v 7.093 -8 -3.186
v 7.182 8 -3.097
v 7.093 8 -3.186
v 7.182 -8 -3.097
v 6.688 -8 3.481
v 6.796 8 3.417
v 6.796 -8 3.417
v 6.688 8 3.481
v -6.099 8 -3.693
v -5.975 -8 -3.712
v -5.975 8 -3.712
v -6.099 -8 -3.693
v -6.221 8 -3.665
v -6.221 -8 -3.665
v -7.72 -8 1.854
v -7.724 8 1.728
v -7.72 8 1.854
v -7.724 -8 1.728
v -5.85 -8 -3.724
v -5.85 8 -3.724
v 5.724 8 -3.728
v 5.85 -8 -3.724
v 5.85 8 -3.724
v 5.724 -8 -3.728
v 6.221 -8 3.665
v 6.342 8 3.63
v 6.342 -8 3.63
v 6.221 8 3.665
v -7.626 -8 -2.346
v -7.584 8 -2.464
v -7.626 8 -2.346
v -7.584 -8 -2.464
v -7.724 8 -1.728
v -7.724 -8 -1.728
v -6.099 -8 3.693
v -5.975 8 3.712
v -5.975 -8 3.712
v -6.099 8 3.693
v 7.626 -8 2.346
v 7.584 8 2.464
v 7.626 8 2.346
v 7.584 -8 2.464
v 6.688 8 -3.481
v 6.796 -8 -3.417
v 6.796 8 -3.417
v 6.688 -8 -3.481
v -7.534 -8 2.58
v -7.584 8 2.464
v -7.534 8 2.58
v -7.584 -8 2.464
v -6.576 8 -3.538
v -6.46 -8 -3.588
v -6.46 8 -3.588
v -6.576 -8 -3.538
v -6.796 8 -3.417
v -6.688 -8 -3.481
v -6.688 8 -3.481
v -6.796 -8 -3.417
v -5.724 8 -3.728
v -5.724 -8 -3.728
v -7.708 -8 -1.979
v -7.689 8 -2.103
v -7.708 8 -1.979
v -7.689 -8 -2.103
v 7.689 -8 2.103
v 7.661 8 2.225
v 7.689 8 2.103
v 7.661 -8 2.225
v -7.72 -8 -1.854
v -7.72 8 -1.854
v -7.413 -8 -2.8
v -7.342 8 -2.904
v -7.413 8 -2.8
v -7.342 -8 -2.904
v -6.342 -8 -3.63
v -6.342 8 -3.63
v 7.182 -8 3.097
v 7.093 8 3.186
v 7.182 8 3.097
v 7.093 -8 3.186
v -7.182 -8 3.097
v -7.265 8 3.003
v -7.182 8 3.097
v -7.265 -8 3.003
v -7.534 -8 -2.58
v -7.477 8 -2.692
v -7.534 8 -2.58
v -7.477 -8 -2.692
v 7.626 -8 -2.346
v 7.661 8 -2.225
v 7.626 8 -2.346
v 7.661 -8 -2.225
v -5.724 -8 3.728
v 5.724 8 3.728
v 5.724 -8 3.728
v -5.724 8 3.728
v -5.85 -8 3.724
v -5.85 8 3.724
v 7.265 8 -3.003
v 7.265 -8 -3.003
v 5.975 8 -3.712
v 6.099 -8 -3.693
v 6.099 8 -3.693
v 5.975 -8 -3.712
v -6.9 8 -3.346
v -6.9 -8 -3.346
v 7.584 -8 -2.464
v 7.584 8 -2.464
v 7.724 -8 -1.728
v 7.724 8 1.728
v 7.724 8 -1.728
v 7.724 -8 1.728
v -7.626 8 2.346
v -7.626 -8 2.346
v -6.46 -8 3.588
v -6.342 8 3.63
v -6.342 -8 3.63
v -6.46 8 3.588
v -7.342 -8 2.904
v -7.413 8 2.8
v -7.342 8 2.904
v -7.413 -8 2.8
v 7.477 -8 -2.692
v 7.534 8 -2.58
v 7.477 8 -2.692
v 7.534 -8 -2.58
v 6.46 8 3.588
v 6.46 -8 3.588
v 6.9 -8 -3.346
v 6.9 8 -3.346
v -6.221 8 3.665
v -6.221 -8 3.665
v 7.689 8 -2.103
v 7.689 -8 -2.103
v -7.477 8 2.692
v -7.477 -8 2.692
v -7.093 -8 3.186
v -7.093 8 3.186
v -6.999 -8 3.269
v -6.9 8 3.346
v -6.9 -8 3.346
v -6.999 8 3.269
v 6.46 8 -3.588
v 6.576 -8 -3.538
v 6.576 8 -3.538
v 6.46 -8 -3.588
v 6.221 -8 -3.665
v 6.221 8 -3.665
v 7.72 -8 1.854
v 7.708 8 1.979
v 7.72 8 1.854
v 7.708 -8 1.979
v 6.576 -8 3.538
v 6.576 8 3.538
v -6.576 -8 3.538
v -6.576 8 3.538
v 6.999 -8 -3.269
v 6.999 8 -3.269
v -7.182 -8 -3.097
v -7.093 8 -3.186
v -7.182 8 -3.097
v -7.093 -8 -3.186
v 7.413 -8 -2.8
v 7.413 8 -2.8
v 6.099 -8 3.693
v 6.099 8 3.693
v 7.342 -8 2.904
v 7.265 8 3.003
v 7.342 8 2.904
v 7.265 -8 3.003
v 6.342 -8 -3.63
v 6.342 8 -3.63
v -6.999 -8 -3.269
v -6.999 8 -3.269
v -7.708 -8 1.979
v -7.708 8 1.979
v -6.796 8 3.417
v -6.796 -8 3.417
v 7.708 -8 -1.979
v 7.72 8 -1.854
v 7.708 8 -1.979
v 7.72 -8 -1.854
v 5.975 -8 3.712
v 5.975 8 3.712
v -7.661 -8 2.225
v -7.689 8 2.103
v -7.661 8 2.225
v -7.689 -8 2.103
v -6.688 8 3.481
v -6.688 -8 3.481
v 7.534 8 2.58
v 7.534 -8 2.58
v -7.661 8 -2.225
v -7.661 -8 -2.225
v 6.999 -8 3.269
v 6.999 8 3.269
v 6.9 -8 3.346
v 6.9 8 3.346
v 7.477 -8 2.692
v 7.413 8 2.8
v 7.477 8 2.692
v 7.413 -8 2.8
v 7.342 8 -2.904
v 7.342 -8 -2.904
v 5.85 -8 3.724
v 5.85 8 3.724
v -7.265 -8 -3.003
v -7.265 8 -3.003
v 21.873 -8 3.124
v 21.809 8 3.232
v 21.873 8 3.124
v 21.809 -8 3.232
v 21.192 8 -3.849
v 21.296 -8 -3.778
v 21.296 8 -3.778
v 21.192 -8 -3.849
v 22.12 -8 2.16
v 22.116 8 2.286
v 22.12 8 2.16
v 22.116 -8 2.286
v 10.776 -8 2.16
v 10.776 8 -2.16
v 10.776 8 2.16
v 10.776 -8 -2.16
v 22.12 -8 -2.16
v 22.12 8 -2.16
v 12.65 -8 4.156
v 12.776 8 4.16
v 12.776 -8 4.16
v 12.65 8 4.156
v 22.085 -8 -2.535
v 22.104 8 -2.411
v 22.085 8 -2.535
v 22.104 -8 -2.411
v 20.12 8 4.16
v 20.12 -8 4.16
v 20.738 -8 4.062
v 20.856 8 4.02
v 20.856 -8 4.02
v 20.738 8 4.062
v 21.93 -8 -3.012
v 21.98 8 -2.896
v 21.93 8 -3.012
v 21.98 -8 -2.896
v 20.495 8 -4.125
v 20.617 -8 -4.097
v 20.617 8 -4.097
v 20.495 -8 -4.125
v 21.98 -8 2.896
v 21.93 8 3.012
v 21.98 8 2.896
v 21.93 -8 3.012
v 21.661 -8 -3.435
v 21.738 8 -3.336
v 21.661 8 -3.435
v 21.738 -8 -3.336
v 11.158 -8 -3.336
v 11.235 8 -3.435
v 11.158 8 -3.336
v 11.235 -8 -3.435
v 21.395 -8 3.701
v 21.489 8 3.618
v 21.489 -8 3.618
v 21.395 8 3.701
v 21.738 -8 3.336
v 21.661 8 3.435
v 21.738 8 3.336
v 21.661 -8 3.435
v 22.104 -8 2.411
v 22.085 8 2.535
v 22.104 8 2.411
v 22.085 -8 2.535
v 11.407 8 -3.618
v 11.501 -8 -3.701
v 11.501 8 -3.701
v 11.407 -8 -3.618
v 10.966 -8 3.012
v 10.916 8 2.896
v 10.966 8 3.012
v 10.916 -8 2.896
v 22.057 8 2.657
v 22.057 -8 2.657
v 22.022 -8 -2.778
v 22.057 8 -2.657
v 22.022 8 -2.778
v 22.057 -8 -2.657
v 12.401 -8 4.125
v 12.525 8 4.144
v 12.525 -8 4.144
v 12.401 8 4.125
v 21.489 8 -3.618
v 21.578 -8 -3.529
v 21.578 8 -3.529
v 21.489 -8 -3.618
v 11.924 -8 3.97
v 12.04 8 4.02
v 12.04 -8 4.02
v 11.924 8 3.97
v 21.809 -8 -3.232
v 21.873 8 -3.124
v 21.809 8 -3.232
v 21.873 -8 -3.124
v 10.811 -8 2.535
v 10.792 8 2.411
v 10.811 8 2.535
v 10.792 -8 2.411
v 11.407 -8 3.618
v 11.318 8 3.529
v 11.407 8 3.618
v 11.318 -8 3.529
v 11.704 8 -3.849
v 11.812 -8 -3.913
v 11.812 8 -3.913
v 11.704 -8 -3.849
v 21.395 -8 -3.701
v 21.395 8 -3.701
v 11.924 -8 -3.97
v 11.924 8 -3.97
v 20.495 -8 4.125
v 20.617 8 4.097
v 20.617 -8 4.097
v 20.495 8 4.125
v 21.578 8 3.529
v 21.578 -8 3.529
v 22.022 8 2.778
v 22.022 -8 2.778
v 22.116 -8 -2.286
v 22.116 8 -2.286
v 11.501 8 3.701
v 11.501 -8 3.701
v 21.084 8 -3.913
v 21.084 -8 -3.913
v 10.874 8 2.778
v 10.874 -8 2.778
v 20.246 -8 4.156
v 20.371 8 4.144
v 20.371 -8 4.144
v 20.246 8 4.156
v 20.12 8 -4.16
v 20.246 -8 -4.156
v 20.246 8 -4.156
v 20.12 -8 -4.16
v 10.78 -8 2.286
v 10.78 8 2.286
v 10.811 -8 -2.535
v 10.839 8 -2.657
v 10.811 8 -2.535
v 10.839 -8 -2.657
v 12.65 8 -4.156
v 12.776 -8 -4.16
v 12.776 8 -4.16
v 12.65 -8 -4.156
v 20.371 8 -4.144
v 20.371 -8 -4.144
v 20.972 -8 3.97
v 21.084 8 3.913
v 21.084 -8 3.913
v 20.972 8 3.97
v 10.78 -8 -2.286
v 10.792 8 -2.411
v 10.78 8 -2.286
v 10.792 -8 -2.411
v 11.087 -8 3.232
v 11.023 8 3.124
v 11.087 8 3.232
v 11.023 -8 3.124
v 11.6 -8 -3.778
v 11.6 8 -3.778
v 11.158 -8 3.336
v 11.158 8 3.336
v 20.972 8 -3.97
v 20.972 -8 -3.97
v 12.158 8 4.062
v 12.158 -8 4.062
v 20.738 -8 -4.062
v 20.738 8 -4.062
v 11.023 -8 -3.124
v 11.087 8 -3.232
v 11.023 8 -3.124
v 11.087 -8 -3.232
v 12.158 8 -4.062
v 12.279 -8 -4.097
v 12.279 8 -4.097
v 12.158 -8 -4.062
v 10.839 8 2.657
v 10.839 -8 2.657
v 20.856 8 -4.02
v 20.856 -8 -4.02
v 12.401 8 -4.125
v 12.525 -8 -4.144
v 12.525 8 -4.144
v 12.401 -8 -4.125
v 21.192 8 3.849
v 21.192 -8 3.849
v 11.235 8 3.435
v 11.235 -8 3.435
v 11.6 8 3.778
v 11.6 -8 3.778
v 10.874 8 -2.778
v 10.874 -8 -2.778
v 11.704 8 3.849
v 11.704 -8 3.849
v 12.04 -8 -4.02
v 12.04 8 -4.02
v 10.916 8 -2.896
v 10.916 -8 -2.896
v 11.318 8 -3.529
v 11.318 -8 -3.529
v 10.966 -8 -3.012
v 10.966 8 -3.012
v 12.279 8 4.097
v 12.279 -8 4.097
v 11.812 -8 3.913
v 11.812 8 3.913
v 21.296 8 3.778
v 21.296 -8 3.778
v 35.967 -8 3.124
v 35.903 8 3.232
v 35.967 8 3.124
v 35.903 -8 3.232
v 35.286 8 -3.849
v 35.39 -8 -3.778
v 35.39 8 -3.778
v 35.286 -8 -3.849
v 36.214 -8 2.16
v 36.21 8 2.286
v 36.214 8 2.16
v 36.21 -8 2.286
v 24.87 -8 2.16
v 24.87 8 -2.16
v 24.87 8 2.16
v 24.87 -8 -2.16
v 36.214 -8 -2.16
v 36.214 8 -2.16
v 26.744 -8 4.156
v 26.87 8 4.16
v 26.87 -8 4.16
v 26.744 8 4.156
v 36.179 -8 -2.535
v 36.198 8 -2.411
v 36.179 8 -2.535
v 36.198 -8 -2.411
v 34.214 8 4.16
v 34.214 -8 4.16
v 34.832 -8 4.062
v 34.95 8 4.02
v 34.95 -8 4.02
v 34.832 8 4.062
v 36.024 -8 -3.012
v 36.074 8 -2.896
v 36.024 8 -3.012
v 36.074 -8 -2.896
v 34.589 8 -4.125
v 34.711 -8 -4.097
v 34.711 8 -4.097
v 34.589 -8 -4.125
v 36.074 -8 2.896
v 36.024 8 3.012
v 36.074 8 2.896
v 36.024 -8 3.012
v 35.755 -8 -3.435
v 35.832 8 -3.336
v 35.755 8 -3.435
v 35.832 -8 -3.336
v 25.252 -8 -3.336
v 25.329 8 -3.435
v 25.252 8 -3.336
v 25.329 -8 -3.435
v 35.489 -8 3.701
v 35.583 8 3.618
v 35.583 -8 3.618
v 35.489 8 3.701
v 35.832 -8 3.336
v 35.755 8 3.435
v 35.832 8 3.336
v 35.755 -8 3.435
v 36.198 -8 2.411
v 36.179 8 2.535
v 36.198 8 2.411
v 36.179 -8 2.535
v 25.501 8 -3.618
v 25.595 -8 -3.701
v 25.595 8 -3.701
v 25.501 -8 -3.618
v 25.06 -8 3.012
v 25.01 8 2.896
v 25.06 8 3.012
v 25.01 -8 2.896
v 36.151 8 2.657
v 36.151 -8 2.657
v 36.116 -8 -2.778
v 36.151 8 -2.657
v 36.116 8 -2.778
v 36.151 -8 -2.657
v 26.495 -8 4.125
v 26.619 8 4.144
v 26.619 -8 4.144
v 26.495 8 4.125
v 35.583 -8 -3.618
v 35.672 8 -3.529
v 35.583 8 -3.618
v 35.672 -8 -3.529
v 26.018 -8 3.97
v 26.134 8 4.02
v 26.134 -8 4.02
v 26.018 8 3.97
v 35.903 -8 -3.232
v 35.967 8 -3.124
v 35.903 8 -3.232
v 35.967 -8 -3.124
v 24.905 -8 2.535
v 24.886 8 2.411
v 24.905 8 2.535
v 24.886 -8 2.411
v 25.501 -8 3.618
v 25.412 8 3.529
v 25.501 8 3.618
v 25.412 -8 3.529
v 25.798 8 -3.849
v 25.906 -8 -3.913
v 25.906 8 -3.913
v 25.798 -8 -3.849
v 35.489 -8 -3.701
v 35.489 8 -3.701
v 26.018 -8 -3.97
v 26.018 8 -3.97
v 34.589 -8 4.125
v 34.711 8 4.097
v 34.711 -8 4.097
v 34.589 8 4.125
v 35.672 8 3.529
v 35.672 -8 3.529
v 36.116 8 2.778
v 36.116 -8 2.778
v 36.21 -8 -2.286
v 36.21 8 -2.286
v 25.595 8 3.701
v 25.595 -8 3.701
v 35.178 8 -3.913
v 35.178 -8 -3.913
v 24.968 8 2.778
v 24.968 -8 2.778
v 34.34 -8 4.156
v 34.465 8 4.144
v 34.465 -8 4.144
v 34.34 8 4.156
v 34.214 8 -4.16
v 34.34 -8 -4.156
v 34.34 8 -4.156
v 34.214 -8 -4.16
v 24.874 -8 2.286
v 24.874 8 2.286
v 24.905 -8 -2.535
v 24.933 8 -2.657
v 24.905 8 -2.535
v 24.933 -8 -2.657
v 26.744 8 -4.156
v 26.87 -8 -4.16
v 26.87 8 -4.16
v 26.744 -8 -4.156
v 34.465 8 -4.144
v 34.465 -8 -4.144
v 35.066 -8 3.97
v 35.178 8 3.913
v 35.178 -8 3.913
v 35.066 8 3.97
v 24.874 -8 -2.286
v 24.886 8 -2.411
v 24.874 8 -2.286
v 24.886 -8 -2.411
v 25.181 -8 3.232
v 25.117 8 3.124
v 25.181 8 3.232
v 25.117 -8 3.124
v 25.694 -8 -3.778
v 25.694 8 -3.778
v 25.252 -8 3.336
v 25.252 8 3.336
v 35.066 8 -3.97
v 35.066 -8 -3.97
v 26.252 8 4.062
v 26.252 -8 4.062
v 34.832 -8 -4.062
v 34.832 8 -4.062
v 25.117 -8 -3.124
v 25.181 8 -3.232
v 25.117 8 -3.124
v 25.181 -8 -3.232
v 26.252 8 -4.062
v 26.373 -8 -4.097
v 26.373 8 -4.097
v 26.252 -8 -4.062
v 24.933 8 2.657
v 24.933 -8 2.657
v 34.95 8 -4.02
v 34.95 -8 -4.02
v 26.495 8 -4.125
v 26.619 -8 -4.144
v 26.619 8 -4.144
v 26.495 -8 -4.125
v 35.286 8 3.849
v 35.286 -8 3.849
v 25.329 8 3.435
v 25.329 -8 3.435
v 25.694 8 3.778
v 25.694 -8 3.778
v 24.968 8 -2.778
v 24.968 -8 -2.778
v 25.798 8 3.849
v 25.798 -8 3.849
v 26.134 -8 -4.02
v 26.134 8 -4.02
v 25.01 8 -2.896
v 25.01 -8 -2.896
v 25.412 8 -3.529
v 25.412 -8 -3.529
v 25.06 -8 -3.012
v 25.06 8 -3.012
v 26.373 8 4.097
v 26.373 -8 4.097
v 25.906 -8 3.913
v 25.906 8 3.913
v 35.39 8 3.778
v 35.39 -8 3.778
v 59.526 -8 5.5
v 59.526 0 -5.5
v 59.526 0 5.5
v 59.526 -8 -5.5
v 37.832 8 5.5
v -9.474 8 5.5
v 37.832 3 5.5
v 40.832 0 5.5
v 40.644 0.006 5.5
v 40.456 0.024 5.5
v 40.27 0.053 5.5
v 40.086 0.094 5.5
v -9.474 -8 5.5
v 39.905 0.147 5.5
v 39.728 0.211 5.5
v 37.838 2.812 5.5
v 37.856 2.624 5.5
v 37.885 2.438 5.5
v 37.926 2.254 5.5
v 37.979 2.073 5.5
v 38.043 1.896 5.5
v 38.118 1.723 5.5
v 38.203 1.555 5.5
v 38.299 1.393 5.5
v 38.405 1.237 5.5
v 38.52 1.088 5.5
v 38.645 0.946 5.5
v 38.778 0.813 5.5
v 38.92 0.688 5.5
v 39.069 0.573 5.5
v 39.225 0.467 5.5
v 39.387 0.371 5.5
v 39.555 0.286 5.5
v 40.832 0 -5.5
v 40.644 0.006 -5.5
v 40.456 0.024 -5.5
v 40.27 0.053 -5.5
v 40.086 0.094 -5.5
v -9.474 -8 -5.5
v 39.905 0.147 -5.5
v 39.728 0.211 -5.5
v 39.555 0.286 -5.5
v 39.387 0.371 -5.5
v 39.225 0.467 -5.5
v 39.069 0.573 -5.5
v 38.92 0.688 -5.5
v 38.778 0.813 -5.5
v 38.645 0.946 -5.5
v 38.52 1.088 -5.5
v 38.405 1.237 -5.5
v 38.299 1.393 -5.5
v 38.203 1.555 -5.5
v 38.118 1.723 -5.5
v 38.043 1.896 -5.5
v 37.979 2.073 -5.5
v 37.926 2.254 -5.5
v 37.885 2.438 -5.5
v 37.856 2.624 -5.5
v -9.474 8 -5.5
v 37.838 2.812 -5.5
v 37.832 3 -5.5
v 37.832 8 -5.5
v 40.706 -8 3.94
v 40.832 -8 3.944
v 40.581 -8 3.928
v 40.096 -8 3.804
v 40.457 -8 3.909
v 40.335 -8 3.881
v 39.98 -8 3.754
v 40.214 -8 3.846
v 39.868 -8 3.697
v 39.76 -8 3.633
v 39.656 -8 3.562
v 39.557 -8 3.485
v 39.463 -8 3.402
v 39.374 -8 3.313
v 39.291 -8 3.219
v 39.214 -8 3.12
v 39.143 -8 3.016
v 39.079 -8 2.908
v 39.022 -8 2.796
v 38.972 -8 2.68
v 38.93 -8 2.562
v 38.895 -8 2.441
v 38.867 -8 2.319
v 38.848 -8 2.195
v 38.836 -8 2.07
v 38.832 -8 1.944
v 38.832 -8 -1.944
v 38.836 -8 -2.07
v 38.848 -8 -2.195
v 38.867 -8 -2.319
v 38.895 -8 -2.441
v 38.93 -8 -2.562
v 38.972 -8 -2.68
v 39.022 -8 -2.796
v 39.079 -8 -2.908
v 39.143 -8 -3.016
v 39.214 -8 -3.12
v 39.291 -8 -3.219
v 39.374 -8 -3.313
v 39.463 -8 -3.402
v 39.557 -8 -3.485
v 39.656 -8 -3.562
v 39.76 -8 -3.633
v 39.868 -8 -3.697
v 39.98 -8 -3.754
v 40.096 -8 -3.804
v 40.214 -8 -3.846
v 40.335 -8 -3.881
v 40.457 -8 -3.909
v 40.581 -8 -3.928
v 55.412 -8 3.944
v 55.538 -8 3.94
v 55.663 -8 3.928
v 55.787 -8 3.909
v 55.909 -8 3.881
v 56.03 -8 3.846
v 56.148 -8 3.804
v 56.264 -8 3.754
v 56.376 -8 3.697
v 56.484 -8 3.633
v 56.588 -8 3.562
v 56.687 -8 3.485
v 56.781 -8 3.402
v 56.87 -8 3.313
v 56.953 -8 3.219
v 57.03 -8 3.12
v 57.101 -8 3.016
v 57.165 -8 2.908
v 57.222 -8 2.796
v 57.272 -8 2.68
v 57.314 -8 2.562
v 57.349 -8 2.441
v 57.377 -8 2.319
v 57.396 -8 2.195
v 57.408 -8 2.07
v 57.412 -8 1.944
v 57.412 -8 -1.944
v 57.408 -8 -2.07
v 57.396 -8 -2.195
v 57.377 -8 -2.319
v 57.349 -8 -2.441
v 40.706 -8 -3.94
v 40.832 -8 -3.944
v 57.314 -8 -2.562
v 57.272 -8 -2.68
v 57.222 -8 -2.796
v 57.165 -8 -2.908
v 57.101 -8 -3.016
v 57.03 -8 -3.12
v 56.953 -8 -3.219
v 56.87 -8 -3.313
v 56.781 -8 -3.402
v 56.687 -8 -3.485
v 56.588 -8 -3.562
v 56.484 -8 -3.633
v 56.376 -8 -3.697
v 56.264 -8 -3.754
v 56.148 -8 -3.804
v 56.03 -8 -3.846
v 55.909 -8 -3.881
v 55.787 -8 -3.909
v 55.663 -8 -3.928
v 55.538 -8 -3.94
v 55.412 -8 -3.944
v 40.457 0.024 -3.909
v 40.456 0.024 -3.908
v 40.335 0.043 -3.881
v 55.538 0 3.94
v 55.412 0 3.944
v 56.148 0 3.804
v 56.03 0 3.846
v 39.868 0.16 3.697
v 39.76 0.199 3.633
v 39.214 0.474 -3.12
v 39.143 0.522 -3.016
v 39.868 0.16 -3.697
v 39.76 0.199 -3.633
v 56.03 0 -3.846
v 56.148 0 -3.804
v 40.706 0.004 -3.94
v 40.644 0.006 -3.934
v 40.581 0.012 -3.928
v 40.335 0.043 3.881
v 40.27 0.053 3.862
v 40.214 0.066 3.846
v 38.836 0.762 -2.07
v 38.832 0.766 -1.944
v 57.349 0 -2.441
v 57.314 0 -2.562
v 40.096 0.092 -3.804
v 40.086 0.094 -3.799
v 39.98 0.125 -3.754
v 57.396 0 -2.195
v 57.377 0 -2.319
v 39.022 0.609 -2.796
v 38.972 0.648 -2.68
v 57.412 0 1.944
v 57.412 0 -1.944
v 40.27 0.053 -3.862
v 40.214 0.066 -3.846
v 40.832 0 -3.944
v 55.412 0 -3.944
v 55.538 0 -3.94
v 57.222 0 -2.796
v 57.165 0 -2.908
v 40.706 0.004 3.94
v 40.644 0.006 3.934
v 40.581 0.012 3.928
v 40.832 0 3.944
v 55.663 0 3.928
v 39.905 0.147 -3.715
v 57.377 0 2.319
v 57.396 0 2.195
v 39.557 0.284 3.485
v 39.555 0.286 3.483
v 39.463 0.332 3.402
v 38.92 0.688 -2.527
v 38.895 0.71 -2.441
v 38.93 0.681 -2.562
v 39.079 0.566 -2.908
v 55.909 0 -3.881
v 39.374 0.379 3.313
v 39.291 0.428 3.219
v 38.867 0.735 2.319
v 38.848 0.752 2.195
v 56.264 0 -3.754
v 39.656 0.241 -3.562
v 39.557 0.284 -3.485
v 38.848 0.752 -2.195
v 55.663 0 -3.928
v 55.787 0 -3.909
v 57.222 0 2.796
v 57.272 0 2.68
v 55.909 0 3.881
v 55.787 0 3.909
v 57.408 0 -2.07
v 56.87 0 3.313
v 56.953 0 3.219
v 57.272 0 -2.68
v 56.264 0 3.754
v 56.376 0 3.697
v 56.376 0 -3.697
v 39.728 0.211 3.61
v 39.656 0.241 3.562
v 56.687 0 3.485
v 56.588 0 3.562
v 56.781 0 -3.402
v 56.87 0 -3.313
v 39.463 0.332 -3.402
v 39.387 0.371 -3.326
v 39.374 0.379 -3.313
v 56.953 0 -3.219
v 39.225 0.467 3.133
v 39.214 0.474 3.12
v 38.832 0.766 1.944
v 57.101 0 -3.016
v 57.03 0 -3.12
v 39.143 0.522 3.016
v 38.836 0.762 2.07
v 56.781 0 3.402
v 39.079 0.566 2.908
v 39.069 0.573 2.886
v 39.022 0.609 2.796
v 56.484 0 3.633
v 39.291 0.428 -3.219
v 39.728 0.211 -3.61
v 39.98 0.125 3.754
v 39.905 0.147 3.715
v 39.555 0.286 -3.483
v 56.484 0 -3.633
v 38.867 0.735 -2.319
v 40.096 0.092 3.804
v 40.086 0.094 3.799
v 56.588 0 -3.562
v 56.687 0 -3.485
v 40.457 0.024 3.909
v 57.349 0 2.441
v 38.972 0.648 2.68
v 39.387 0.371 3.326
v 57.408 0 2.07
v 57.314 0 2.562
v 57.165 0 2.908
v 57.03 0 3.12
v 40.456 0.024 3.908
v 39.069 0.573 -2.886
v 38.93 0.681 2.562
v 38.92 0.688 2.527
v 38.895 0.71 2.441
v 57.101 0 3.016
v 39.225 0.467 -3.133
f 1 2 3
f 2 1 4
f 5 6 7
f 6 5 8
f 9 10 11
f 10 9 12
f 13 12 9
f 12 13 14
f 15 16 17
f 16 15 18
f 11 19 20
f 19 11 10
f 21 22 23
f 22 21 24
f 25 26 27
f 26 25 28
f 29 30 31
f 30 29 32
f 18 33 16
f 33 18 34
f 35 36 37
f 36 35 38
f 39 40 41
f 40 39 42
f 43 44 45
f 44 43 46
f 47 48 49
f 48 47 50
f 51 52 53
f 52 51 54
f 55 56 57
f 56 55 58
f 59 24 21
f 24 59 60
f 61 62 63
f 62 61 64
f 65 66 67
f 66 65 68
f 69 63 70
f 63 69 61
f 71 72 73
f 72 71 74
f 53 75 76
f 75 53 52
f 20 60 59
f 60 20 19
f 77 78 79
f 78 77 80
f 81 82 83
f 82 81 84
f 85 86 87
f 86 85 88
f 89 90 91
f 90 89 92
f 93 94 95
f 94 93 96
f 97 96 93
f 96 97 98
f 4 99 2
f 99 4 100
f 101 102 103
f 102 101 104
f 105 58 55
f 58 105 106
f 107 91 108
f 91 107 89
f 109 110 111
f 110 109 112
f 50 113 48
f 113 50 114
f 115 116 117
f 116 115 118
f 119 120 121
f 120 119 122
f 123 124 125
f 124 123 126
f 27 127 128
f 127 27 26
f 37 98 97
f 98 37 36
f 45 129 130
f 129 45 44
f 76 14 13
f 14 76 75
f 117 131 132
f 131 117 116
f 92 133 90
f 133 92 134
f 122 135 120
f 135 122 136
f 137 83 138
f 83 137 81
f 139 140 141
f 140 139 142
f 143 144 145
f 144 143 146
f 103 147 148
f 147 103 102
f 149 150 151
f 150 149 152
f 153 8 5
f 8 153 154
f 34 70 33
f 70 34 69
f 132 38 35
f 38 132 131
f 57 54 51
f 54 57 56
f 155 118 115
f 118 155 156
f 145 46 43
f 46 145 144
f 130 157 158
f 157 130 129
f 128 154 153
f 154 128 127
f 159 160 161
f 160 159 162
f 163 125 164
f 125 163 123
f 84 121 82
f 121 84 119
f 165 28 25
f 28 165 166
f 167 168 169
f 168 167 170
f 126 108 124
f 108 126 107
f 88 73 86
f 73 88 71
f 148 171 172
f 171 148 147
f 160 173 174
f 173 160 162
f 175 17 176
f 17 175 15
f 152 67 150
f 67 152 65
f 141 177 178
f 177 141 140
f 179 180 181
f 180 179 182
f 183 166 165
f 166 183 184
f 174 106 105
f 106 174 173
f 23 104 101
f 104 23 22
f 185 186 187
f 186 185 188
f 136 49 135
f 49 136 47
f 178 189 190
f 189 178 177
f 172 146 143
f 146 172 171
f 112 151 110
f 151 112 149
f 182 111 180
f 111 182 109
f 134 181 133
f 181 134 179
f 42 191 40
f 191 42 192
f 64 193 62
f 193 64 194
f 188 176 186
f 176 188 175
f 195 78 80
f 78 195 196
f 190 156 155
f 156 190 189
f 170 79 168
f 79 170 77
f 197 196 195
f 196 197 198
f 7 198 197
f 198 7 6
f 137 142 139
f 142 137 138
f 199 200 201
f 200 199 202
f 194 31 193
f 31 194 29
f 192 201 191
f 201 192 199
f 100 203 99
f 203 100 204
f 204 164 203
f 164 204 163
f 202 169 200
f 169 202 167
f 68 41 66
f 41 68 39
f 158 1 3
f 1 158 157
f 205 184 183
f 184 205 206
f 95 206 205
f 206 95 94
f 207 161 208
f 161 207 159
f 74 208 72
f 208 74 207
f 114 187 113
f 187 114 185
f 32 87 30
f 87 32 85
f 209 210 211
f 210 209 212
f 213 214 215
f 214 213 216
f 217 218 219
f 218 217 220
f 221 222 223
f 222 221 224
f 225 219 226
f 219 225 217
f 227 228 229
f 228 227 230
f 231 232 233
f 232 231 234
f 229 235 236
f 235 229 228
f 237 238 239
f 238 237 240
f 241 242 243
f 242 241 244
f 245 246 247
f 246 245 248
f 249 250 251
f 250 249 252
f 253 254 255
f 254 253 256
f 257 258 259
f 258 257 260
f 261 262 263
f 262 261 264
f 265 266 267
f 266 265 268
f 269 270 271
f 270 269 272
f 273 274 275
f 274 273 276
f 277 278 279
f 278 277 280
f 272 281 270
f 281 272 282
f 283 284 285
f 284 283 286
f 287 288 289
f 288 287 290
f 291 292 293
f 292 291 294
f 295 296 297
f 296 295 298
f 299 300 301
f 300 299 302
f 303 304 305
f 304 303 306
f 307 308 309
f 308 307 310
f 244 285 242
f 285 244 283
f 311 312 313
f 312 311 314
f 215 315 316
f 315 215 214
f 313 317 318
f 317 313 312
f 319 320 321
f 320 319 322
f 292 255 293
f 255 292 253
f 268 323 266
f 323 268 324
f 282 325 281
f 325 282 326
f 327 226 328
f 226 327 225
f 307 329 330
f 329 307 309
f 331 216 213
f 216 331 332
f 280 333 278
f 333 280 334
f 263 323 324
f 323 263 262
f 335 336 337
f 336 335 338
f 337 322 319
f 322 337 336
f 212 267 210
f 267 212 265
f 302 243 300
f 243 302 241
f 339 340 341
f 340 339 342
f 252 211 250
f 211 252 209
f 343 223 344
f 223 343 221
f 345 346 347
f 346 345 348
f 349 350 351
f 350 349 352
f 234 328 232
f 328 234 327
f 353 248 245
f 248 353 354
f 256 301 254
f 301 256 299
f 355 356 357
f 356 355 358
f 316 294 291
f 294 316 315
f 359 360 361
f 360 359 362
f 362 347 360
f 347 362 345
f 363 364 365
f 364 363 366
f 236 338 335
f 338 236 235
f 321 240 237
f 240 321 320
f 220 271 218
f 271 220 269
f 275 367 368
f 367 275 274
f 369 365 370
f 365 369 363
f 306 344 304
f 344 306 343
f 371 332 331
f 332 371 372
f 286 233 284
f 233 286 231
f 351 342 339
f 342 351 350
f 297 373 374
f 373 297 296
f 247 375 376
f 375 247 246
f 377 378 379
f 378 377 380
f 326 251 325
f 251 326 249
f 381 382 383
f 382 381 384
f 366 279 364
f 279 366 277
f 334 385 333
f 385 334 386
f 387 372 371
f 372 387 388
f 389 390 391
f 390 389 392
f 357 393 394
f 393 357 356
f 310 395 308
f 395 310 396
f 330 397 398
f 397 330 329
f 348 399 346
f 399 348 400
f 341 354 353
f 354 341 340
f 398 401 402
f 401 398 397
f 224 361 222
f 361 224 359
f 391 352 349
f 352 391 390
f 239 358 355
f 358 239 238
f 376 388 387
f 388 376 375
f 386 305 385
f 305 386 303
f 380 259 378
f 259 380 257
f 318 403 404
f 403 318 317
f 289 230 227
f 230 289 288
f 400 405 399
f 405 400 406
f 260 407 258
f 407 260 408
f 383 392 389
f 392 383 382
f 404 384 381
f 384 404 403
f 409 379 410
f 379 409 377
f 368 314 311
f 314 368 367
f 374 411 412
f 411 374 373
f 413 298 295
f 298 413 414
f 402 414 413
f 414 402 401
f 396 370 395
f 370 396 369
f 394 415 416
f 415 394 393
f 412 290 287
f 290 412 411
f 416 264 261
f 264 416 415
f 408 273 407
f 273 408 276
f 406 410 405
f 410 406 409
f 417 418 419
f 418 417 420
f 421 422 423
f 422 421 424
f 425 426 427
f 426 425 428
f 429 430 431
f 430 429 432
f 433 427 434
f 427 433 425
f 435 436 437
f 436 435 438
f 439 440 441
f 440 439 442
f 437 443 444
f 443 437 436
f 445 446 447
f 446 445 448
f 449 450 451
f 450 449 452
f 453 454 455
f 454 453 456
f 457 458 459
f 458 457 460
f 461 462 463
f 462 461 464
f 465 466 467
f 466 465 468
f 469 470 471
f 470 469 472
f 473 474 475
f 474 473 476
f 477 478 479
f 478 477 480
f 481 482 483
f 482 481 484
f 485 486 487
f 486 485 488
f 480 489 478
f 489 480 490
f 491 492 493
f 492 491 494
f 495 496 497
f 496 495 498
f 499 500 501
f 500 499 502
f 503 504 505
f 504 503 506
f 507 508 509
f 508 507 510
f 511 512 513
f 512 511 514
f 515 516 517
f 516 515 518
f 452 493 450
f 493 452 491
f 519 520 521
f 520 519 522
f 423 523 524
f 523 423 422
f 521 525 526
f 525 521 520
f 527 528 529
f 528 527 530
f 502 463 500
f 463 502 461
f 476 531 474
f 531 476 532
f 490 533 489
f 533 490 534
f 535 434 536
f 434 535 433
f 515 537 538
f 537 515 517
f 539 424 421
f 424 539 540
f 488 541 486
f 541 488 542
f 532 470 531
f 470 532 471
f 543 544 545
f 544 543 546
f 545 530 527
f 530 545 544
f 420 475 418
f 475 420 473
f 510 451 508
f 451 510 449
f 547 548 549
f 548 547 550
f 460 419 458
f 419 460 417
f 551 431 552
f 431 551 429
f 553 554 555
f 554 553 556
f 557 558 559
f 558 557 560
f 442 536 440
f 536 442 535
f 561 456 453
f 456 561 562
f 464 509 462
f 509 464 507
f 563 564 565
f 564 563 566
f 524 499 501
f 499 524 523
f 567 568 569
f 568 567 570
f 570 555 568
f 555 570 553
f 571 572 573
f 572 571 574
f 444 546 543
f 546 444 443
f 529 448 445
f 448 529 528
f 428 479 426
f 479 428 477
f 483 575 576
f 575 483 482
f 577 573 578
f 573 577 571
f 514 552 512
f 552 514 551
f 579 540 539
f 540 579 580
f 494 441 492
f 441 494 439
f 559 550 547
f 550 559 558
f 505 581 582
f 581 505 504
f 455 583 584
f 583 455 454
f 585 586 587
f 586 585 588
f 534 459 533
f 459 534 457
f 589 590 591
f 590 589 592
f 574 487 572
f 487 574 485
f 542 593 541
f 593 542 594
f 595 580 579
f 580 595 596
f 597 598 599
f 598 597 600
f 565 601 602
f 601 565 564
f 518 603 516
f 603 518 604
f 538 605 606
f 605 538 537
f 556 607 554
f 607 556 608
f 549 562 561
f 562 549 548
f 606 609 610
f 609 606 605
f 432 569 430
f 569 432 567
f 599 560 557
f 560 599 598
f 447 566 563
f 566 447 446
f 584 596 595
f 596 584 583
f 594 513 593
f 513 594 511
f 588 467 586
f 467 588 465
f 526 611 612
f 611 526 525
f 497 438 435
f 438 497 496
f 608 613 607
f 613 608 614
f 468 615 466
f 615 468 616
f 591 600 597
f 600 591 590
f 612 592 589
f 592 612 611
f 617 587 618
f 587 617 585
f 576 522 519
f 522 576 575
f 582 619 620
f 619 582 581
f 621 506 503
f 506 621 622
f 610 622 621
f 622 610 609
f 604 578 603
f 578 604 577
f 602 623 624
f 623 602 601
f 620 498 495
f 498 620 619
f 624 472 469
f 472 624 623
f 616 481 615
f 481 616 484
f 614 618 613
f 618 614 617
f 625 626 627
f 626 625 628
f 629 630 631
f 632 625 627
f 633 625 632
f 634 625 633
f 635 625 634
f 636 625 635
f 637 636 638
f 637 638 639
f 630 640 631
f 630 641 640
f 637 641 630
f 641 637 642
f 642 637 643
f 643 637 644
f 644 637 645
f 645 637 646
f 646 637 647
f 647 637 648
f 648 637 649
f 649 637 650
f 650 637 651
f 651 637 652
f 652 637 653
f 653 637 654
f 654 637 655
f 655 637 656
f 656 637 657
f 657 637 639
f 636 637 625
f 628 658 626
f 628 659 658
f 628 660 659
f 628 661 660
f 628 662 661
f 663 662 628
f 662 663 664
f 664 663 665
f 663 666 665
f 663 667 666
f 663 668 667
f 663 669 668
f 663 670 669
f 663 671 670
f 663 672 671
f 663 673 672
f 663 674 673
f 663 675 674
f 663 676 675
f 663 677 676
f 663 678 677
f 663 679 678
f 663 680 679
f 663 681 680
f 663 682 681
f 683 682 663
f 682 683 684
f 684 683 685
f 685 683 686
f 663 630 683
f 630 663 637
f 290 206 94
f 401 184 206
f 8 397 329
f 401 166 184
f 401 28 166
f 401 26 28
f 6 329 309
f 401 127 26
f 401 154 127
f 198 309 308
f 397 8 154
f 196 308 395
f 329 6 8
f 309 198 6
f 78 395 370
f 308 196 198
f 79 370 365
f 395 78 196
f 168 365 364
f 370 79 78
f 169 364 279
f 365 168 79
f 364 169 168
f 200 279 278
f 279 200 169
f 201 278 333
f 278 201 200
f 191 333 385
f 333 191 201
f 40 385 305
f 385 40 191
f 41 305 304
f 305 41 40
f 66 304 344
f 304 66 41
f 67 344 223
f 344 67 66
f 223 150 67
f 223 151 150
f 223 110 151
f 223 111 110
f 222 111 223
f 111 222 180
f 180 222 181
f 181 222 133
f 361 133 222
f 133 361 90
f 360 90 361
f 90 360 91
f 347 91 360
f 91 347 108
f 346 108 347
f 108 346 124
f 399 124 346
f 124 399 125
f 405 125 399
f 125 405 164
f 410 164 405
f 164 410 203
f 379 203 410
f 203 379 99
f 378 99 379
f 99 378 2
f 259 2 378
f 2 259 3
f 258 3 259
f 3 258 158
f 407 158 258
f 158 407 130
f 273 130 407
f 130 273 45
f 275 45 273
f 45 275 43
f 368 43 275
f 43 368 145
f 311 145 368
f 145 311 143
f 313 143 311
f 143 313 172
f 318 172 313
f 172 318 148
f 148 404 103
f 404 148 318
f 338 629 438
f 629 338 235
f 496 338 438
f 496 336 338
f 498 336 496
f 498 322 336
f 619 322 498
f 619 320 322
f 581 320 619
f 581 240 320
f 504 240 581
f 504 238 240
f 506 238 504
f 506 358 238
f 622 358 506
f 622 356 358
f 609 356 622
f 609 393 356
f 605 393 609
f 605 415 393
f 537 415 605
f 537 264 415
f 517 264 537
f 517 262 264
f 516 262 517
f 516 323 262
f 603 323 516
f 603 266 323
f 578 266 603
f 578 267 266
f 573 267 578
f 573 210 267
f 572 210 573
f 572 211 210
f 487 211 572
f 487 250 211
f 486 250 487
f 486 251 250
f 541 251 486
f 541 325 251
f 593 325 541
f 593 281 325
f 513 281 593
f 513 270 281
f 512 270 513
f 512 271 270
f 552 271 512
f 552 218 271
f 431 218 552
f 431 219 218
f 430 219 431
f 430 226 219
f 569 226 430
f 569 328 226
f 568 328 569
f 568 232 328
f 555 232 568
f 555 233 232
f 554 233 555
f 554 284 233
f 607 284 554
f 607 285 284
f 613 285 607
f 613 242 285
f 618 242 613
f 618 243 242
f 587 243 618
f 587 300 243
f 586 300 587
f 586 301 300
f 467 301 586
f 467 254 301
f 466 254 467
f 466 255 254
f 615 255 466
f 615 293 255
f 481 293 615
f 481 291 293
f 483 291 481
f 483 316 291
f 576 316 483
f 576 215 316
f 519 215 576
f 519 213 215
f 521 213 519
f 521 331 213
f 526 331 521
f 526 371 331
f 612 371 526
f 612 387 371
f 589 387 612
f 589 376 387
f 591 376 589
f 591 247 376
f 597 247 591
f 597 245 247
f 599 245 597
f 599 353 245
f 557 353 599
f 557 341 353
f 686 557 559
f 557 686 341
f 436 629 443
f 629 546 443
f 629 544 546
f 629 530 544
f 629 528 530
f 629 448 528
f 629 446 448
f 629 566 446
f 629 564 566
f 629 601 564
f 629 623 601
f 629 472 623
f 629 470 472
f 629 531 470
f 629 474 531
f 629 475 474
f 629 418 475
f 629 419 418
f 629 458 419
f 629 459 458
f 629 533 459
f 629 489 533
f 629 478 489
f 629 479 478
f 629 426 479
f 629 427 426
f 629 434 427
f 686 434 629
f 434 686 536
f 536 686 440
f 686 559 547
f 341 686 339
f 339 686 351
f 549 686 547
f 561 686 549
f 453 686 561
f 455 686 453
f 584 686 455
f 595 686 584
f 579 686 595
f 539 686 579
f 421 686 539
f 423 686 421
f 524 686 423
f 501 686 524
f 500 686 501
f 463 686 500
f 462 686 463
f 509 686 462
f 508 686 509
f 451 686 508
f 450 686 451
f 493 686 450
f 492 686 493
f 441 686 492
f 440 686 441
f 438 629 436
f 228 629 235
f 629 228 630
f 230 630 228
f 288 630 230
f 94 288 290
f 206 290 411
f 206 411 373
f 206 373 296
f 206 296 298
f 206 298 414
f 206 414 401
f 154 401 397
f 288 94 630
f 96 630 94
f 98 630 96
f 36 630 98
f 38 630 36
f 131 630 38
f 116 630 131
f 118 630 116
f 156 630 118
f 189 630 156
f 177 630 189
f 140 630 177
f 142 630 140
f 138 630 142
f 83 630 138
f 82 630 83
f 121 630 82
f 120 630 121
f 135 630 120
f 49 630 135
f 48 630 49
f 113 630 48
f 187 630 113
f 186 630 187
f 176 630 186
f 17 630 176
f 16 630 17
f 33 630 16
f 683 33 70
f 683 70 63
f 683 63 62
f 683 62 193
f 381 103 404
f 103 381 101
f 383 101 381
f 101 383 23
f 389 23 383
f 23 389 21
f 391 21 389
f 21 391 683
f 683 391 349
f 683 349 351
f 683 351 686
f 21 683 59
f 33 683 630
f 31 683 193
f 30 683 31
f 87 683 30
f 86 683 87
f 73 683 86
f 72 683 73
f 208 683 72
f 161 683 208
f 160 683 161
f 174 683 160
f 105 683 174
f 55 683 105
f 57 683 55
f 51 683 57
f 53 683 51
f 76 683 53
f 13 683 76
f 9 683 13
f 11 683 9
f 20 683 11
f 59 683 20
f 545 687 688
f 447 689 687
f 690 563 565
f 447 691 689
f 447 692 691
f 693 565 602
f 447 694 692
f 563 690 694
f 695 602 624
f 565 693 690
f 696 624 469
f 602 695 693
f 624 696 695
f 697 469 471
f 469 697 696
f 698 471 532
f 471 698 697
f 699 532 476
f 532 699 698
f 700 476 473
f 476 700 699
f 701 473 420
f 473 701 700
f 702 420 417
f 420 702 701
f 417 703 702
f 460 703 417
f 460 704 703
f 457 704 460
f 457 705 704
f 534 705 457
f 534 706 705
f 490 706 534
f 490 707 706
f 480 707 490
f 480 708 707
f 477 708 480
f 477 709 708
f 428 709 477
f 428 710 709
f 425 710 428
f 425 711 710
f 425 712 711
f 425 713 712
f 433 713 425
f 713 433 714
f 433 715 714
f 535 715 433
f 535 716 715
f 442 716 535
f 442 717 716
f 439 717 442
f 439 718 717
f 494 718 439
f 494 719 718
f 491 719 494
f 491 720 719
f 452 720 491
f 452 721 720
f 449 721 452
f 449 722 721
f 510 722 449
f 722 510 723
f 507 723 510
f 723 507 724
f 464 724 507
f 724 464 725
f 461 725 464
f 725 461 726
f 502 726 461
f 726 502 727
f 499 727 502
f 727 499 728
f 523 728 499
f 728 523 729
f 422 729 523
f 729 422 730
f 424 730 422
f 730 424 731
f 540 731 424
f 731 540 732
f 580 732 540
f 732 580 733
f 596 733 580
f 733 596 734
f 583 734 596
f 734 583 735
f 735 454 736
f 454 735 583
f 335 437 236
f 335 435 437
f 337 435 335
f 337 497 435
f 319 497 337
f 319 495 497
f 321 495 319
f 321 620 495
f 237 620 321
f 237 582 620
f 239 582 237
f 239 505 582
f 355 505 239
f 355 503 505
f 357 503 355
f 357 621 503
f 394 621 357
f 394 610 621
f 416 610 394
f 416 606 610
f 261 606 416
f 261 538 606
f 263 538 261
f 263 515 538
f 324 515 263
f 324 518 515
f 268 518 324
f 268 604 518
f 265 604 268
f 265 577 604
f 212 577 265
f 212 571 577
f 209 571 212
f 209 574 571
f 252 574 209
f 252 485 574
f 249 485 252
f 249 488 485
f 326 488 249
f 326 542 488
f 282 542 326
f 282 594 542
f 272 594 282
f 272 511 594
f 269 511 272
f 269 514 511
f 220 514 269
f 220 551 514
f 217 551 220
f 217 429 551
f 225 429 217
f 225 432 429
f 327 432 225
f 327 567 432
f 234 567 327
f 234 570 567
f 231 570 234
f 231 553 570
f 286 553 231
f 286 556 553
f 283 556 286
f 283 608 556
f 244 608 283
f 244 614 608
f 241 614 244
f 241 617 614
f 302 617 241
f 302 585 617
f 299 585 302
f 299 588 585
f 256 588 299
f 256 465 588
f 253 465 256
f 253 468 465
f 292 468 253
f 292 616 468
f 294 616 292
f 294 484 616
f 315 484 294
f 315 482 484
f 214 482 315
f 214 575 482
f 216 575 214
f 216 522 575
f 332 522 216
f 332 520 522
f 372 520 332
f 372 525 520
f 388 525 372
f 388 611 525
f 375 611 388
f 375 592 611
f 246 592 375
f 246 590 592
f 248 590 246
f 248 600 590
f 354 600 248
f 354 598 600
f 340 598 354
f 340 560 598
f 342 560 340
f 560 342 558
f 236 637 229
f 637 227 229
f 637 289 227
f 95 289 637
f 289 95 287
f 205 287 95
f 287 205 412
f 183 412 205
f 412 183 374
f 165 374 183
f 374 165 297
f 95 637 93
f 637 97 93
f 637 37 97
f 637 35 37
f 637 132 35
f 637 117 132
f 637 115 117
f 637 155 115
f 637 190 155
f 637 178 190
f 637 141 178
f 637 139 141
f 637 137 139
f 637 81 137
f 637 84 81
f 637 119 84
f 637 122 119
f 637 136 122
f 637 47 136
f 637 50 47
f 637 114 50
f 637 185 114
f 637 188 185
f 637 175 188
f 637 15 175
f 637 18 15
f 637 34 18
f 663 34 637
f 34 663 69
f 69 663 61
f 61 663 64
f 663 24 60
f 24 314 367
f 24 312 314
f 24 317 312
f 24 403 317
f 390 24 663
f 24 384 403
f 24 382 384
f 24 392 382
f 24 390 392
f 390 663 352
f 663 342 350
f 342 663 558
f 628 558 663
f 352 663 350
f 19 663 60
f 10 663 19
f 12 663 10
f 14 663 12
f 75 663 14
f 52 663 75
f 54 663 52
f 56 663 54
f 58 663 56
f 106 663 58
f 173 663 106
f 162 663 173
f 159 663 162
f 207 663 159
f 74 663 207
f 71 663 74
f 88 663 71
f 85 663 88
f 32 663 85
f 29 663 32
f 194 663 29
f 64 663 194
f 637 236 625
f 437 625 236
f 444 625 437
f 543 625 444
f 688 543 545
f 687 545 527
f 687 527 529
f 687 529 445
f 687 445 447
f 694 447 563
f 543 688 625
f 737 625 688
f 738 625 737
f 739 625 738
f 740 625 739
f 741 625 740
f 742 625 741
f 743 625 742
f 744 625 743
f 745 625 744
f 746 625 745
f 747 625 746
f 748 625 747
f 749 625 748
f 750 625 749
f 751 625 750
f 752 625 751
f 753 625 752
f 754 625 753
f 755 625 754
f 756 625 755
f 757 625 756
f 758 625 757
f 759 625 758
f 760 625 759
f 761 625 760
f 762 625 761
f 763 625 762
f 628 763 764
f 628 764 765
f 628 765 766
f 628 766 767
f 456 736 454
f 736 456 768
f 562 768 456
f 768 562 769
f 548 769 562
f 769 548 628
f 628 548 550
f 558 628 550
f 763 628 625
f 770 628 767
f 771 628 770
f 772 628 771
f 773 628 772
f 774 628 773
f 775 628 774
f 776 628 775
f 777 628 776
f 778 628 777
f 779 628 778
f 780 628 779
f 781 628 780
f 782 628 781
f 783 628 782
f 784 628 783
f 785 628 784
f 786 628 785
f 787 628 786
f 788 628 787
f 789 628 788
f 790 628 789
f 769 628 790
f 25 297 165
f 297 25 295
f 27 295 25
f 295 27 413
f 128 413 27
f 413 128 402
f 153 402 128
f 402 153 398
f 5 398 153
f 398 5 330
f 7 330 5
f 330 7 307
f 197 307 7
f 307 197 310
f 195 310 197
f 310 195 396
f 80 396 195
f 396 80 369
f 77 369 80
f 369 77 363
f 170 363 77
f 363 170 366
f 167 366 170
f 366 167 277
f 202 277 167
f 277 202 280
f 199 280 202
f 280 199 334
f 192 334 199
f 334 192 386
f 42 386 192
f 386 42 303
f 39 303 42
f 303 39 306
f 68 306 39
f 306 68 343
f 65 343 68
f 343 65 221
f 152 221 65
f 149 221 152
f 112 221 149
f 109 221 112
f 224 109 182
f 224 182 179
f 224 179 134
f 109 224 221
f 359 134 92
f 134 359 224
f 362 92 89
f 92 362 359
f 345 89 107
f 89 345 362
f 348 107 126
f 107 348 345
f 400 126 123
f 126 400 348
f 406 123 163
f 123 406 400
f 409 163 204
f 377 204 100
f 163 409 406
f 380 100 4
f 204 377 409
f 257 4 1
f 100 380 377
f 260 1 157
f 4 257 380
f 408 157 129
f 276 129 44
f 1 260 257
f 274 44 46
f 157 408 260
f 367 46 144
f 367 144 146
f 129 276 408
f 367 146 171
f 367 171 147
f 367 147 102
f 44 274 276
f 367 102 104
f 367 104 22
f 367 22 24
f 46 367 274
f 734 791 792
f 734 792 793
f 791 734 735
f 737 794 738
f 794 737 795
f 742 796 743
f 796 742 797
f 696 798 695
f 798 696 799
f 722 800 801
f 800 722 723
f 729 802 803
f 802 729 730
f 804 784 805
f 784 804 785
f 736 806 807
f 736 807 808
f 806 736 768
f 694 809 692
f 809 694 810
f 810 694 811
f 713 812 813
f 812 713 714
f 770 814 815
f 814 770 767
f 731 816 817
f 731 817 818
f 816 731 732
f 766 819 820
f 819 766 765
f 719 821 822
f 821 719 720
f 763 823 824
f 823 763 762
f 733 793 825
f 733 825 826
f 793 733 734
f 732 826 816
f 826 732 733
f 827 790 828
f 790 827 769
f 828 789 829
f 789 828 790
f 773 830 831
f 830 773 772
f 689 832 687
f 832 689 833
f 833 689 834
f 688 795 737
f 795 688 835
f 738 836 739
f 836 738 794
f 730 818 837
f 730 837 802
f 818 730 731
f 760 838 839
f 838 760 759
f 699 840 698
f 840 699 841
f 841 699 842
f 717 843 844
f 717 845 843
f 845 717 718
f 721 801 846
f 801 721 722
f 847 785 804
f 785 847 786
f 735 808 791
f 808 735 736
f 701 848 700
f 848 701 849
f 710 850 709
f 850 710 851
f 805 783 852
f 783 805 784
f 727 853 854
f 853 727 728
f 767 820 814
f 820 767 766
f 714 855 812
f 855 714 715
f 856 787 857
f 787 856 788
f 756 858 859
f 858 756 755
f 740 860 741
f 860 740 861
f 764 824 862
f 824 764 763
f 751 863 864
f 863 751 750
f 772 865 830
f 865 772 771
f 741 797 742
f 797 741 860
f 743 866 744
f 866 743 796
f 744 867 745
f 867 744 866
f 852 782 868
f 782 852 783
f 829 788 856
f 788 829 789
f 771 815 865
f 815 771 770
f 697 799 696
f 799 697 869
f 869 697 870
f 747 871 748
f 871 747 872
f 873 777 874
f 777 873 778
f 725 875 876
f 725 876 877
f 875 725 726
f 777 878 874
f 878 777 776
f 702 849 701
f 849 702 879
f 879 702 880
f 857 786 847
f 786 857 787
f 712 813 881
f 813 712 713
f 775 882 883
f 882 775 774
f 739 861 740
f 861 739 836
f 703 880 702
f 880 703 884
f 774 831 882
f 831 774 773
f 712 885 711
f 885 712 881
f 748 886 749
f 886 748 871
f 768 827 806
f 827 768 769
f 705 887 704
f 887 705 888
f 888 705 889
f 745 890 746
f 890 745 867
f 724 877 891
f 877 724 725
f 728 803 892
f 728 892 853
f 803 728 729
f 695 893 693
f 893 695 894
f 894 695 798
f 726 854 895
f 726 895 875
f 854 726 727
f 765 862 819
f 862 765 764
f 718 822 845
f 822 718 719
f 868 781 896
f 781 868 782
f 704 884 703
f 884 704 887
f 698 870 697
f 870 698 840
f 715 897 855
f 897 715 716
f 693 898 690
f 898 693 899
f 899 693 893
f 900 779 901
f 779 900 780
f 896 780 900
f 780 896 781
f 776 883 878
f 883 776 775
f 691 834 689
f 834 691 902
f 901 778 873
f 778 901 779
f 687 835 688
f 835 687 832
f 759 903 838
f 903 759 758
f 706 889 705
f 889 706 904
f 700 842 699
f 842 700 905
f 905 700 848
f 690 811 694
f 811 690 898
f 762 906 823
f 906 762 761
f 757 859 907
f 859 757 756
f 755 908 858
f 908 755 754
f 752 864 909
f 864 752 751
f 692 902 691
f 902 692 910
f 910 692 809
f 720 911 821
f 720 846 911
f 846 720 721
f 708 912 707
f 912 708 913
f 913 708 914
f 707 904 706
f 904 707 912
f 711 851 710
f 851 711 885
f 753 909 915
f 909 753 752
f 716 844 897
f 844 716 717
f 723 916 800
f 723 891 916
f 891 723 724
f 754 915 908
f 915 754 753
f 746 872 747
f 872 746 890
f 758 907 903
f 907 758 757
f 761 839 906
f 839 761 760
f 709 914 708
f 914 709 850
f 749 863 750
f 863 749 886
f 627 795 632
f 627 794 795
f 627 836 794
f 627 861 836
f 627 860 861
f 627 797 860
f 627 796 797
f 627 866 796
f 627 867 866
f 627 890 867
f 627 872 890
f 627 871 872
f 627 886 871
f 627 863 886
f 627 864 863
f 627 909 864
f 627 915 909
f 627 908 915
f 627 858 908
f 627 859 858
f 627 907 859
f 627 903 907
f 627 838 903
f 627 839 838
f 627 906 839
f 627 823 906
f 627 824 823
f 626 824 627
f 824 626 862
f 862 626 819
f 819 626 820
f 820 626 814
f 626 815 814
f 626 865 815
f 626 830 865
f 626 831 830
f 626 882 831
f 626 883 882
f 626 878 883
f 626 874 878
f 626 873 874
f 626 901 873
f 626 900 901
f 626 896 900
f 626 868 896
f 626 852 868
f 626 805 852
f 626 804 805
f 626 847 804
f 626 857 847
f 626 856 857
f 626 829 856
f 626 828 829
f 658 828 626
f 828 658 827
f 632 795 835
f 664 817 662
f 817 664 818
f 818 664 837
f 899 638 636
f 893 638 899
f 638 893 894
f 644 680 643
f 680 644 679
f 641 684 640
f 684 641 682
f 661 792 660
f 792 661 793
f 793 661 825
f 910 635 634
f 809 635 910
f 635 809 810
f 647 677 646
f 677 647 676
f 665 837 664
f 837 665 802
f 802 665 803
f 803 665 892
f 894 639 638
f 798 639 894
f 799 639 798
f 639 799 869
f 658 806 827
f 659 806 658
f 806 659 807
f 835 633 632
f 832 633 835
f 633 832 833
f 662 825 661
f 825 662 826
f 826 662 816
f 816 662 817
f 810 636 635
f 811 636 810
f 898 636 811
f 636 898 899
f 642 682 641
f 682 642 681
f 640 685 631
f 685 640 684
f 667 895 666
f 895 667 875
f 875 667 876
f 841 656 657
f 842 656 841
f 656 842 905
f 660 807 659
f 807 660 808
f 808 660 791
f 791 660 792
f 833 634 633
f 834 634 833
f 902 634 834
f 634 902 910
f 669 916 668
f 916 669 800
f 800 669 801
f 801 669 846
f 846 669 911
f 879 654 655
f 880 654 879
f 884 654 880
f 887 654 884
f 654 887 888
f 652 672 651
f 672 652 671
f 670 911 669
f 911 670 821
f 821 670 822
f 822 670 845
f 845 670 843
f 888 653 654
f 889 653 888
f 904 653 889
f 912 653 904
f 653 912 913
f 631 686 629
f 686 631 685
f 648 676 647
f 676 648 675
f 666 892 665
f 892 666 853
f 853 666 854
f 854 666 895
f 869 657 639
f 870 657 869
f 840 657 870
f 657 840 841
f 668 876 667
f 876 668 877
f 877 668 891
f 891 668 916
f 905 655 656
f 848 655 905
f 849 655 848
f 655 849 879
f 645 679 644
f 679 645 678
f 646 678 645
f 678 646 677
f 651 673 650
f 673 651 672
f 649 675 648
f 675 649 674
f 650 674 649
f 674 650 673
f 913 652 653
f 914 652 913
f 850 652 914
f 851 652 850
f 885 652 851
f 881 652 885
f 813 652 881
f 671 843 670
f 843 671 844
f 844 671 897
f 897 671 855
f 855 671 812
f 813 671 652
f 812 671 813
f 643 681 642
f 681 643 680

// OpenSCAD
// file: magsafe.scad
$fn=100;

module magsafe_adapter(cutout=false) {
  // main body
  color("Silver")
  hull() {
    if (cutout == true) {
      translate([-(ms_body_width/2), -(ms_body_height/2), 0]) cylinder(r=ms_body_fillet_radius, h=ms_body_length * 4, center=true);
      translate([ (ms_body_width/2), -(ms_body_height/2), 0]) cylinder(r=ms_body_fillet_radius, h=ms_body_length * 4, center=true);
      translate([ (ms_body_width/2),  (ms_body_height/2), 0]) cylinder(r=ms_body_fillet_radius, h=ms_body_length * 4, center=true);
      translate([-(ms_body_width/2),  (ms_body_height/2), 0]) cylinder(r=ms_body_fillet_radius, h=ms_body_length * 4, center=true);
    } else {
      translate([-(ms_body_width/2), -(ms_body_height/2), 0]) cylinder(r=ms_body_fillet_radius, h=ms_body_length, center=true);
      translate([ (ms_body_width/2), -(ms_body_height/2), 0]) cylinder(r=ms_body_fillet_radius, h=ms_body_length, center=true);
      translate([ (ms_body_width/2),  (ms_body_height/2), 0]) cylinder(r=ms_body_fillet_radius, h=ms_body_length, center=true);
      translate([-(ms_body_width/2),  (ms_body_height/2), 0]) cylinder(r=ms_body_fillet_radius, h=ms_body_length, center=true);
    }
  }

  if (cutout == false) {
    // metal connector
    color("Silver")
    translate([0,0,(ms_body_length + ms_conn_length)/2]) {
      hull() {
        translate([-(ms_conn_width/2), -(ms_conn_height/2), 0]) cylinder(r=ms_conn_fillet_radius, h=ms_conn_length, center=true);
        translate([ (ms_conn_width/2), -(ms_conn_height/2), 0]) cylinder(r=ms_conn_fillet_radius, h=ms_conn_length, center=true);
        translate([ (ms_conn_width/2),  (ms_conn_height/2), 0]) cylinder(r=ms_conn_fillet_radius, h=ms_conn_length, center=true);
        translate([-(ms_conn_width/2),  (ms_conn_height/2), 0]) cylinder(r=ms_conn_fillet_radius, h=ms_conn_length, center=true);
      }
    }
  }
}

module original_cd_magsafe() {
  color("Silver") cylinder(d=oms_barrel_diam, h=oms_barrel_length, center=true);
}

module magsafe(cutout=false) {
  rotate([0,90,180]) {
    union() {
      rotate([0,-90,0]) magsafe_adapter(cutout);
      if (cutout == false) {
        translate([5 + 3.5,0,-5]) original_cd_magsafe();
      }
    }
  }
}
// file: usb.scad
$fn=100;

module usb(cutout=false) {
  // main body
  color("White")
  hull() {
    if (cutout == true) {
      translate([-(usb_body_width/2), -(usb_body_height/2), 0]) cylinder(r=usb_body_fillet_radius, h=usb_body_length * 4, center=true);
      translate([ (usb_body_width/2), -(usb_body_height/2), 0]) cylinder(r=usb_body_fillet_radius, h=usb_body_length * 4, center=true);
      translate([ (usb_body_width/2),  (usb_body_height/2), 0]) cylinder(r=usb_body_fillet_radius, h=usb_body_length * 4, center=true);
      translate([-(usb_body_width/2),  (usb_body_height/2), 0]) cylinder(r=usb_body_fillet_radius, h=usb_body_length * 4, center=true);
    } else {
      translate([-(usb_body_width/2), -(usb_body_height/2), 0]) cylinder(r=usb_body_fillet_radius, h=usb_body_length, center=true);
      translate([ (usb_body_width/2), -(usb_body_height/2), 0]) cylinder(r=usb_body_fillet_radius, h=usb_body_length, center=true);
      translate([ (usb_body_width/2),  (usb_body_height/2), 0]) cylinder(r=usb_body_fillet_radius, h=usb_body_length, center=true);
      translate([-(usb_body_width/2),  (usb_body_height/2), 0]) cylinder(r=usb_body_fillet_radius, h=usb_body_length, center=true);
    }
  }

  // metal connector
  color("Silver")
  translate([0,0,(usb_body_length + usb_conn_length)/2]) {
    cube(size=[usb_conn_width, usb_conn_height, usb_conn_length], center=true);
  }
}
// file: thunderbolt.scad
$fn=100;

module thunderbolt(cutout=false) {
  // main body
  color("White")
  hull() {
    if (cutout == true) {
      translate([-(tb_body_width/2), -(tb_body_height/2), 0]) cylinder(r=tb_body_fillet_radius, h=tb_body_length * 2, center=true);
      translate([ (tb_body_width/2), -(tb_body_height/2), 0]) cylinder(r=tb_body_fillet_radius, h=tb_body_length * 2, center=true);
      translate([ (tb_body_width/2),  (tb_body_height/2), 0]) cylinder(r=tb_body_fillet_radius, h=tb_body_length * 2, center=true);
      translate([-(tb_body_width/2),  (tb_body_height/2), 0]) cylinder(r=tb_body_fillet_radius, h=tb_body_length * 2, center=true);
    } else {
      translate([-(tb_body_width/2), -(tb_body_height/2), 0]) cylinder(r=tb_body_fillet_radius, h=tb_body_length, center=true);
      translate([ (tb_body_width/2), -(tb_body_height/2), 0]) cylinder(r=tb_body_fillet_radius, h=tb_body_length, center=true);
      translate([ (tb_body_width/2),  (tb_body_height/2), 0]) cylinder(r=tb_body_fillet_radius, h=tb_body_length, center=true);
      translate([-(tb_body_width/2),  (tb_body_height/2), 0]) cylinder(r=tb_body_fillet_radius, h=tb_body_length, center=true);
    }

  }

  // metal connector
  color("Silver")
  translate([0,0,(tb_body_length + tb_conn_length)/2]) {
    hull() {
      translate([-(tb_conn_width - tb_conn_chamfer)/2, -(tb_conn_height/2), 0]) rotate([0,0,0]) cylinder(r=tb_conn_chamfer, h=tb_conn_length, center=true, $fn=4);
      translate([ (tb_conn_width - tb_conn_chamfer)/2, -(tb_conn_height/2), 0])  rotate([0,0,0]) cylinder(r=tb_conn_chamfer, h=tb_conn_length, center=true, $fn=4);
      translate([ (tb_conn_width/2),  (tb_conn_height/2), 0]) cube(size=[tb_conn_chamfer, tb_conn_chamfer, tb_conn_length], center=true);
      translate([-(tb_conn_width/2),  (tb_conn_height/2), 0]) cube(size=[tb_conn_chamfer, tb_conn_chamfer, tb_conn_length], center=true);
    }
  }
}
// main file
include <thunderbolt.scad>;
include <usb.scad>;
include <magsafe.scad>;

/*
  Test prints with PLA measured about 96% of target size, so bumping sizes up by 4%
  should help get things printing accurately.

  Your printer, filament, and slicing choices may require you tweak this to something else.

*/
shrink_compensation    = 1.08;

/*
  Thunderbolt connector dimensions

  After measuring several Apple thunderbolt connectors it's clear
  that there can be slight variations in size.

  The dimensions used here are from a pre-Thunderbolt 27" Cinema Display.
*/
tb_body_fillet_radius  = 2;
tb_body_length         = 16;
tb_body_width          = shrink_compensation * (10.8 - (tb_body_fillet_radius * 2));
tb_body_height         = shrink_compensation * (8.0 - (tb_body_fillet_radius * 2));
tb_conn_chamfer        = 1;
tb_conn_length         = 8.36;
tb_conn_width          = 7.44 - (tb_conn_chamfer);
tb_conn_height         = 4.55 - (tb_conn_chamfer);

/*
  USB connectors

  The dimensions used here are from a pre-Thunderbolt 27" Cinema Display.
*/
usb_body_fillet_radius = 2;
usb_body_length        = 16;
usb_body_width         = shrink_compensation * (14.6 - (usb_body_fillet_radius * 2));
usb_body_height        = shrink_compensation * (7.2 - (usb_body_fillet_radius * 2));
usb_conn_length        = 12;
usb_conn_width         = 12;
usb_conn_height        = 4.6;

/*
  Magsafe

  This is where you can tweak dimensions for the older Magsafe connector found
  on the pre-Thunderbolt displays when used with the Magsafe 2 adapter.

*/
ms_body_fillet_radius  = 2;
ms_body_length         = 10;
ms_body_width          = shrink_compensation * (17.5 - (ms_body_fillet_radius * 2));
ms_body_height         = shrink_compensation * (7.6 - (ms_body_fillet_radius * 2));
ms_conn_fillet_radius  = 1;
ms_conn_length         = 2.15;
ms_conn_width          = 15.6 - (ms_conn_fillet_radius * 2);
ms_conn_height         =  3.7 - (ms_conn_fillet_radius * 2);
oms_barrel_diam        = 7;
oms_barrel_length      = 26;

/*
  This is where you'd adjust the spacing between connections.
  These values are added to each plug's x position, starting from left to right.

  For example:

  [<-- usb -->][<--- usb to thunderbolt gap -->][<-- thunderbolt -->][ etc ]

*/
usb_tb_gap             = 3.0;  // 3.75 - (3.75 * 0.2);
tb_tb_gap              = 2.75; // 3.50 - (3.75 * 0.2);
tb_mag_gap             = -1.0; // 4.00 - (3.75 * 0.2) - 4.24;

usb_x = 0;
tb1_x = usb_body_width + tb_body_fillet_radius + usb_tb_gap;
tb2_x = tb1_x + tb_body_width + (tb_body_fillet_radius * 2) + tb_tb_gap;
mag_x = tb2_x + ms_body_width + (ms_body_fillet_radius * 2) + tb_mag_gap;

tidy_body_height = 11;
tidy_body_width = usb_body_length;
tidy_body_length = 69;

/* Uncomment to see plugs in their ports */
// translate([0,-0.2,0]) rotate([90,0,0]) usb();
// translate([tb1_x,-0.2,0]) rotate([90,0,0]) thunderbolt();
// translate([tb2_x,-0.2,0]) rotate([90,0,0]) thunderbolt();
// translate([mag_x,-3.2,0]) rotate([90,0,0]) magsafe();

tidy_x = -((usb_body_width/2) + tb_body_fillet_radius + 1.75);
tidy_y = -(usb_body_length/2);
tidy_z = -(tidy_body_height/2);

module tidy() {
  difference() {
    // main body of the cable tidy
    translate([tidy_x,tidy_y,tidy_z]) cube(size=[tidy_body_length, tidy_body_width, tidy_body_height]);

    // connectors, each long enough to cut straight through the body
    translate([usb_x, 0.00, 0.00]) rotate([90,0,0]) usb(true);
    translate([tb1_x, 0.00, 0.00]) rotate([90,0,0]) thunderbolt(true);
    translate([tb2_x, 0.00, 0.00]) rotate([90,0,0]) thunderbolt(true);
    translate([mag_x,-3.05, 0.00]) rotate([90,0,0]) magsafe(true);

    // cutout for the magsafe connector
    hull() {
      translate([mag_x - (ms_body_width/2), 3,0]) cylinder(r=3, h=20, center=true);
      translate([mag_x - (ms_body_width/2), 10,0]) cylinder(r=3, h=20, center=true);
      translate([mag_x + 20, 3,0]) cylinder(r=3, h=20, center=true);
      translate([mag_x + 20, 10,0]) cylinder(r=3, h=20, center=true);
    }
  }
}

tidy();
